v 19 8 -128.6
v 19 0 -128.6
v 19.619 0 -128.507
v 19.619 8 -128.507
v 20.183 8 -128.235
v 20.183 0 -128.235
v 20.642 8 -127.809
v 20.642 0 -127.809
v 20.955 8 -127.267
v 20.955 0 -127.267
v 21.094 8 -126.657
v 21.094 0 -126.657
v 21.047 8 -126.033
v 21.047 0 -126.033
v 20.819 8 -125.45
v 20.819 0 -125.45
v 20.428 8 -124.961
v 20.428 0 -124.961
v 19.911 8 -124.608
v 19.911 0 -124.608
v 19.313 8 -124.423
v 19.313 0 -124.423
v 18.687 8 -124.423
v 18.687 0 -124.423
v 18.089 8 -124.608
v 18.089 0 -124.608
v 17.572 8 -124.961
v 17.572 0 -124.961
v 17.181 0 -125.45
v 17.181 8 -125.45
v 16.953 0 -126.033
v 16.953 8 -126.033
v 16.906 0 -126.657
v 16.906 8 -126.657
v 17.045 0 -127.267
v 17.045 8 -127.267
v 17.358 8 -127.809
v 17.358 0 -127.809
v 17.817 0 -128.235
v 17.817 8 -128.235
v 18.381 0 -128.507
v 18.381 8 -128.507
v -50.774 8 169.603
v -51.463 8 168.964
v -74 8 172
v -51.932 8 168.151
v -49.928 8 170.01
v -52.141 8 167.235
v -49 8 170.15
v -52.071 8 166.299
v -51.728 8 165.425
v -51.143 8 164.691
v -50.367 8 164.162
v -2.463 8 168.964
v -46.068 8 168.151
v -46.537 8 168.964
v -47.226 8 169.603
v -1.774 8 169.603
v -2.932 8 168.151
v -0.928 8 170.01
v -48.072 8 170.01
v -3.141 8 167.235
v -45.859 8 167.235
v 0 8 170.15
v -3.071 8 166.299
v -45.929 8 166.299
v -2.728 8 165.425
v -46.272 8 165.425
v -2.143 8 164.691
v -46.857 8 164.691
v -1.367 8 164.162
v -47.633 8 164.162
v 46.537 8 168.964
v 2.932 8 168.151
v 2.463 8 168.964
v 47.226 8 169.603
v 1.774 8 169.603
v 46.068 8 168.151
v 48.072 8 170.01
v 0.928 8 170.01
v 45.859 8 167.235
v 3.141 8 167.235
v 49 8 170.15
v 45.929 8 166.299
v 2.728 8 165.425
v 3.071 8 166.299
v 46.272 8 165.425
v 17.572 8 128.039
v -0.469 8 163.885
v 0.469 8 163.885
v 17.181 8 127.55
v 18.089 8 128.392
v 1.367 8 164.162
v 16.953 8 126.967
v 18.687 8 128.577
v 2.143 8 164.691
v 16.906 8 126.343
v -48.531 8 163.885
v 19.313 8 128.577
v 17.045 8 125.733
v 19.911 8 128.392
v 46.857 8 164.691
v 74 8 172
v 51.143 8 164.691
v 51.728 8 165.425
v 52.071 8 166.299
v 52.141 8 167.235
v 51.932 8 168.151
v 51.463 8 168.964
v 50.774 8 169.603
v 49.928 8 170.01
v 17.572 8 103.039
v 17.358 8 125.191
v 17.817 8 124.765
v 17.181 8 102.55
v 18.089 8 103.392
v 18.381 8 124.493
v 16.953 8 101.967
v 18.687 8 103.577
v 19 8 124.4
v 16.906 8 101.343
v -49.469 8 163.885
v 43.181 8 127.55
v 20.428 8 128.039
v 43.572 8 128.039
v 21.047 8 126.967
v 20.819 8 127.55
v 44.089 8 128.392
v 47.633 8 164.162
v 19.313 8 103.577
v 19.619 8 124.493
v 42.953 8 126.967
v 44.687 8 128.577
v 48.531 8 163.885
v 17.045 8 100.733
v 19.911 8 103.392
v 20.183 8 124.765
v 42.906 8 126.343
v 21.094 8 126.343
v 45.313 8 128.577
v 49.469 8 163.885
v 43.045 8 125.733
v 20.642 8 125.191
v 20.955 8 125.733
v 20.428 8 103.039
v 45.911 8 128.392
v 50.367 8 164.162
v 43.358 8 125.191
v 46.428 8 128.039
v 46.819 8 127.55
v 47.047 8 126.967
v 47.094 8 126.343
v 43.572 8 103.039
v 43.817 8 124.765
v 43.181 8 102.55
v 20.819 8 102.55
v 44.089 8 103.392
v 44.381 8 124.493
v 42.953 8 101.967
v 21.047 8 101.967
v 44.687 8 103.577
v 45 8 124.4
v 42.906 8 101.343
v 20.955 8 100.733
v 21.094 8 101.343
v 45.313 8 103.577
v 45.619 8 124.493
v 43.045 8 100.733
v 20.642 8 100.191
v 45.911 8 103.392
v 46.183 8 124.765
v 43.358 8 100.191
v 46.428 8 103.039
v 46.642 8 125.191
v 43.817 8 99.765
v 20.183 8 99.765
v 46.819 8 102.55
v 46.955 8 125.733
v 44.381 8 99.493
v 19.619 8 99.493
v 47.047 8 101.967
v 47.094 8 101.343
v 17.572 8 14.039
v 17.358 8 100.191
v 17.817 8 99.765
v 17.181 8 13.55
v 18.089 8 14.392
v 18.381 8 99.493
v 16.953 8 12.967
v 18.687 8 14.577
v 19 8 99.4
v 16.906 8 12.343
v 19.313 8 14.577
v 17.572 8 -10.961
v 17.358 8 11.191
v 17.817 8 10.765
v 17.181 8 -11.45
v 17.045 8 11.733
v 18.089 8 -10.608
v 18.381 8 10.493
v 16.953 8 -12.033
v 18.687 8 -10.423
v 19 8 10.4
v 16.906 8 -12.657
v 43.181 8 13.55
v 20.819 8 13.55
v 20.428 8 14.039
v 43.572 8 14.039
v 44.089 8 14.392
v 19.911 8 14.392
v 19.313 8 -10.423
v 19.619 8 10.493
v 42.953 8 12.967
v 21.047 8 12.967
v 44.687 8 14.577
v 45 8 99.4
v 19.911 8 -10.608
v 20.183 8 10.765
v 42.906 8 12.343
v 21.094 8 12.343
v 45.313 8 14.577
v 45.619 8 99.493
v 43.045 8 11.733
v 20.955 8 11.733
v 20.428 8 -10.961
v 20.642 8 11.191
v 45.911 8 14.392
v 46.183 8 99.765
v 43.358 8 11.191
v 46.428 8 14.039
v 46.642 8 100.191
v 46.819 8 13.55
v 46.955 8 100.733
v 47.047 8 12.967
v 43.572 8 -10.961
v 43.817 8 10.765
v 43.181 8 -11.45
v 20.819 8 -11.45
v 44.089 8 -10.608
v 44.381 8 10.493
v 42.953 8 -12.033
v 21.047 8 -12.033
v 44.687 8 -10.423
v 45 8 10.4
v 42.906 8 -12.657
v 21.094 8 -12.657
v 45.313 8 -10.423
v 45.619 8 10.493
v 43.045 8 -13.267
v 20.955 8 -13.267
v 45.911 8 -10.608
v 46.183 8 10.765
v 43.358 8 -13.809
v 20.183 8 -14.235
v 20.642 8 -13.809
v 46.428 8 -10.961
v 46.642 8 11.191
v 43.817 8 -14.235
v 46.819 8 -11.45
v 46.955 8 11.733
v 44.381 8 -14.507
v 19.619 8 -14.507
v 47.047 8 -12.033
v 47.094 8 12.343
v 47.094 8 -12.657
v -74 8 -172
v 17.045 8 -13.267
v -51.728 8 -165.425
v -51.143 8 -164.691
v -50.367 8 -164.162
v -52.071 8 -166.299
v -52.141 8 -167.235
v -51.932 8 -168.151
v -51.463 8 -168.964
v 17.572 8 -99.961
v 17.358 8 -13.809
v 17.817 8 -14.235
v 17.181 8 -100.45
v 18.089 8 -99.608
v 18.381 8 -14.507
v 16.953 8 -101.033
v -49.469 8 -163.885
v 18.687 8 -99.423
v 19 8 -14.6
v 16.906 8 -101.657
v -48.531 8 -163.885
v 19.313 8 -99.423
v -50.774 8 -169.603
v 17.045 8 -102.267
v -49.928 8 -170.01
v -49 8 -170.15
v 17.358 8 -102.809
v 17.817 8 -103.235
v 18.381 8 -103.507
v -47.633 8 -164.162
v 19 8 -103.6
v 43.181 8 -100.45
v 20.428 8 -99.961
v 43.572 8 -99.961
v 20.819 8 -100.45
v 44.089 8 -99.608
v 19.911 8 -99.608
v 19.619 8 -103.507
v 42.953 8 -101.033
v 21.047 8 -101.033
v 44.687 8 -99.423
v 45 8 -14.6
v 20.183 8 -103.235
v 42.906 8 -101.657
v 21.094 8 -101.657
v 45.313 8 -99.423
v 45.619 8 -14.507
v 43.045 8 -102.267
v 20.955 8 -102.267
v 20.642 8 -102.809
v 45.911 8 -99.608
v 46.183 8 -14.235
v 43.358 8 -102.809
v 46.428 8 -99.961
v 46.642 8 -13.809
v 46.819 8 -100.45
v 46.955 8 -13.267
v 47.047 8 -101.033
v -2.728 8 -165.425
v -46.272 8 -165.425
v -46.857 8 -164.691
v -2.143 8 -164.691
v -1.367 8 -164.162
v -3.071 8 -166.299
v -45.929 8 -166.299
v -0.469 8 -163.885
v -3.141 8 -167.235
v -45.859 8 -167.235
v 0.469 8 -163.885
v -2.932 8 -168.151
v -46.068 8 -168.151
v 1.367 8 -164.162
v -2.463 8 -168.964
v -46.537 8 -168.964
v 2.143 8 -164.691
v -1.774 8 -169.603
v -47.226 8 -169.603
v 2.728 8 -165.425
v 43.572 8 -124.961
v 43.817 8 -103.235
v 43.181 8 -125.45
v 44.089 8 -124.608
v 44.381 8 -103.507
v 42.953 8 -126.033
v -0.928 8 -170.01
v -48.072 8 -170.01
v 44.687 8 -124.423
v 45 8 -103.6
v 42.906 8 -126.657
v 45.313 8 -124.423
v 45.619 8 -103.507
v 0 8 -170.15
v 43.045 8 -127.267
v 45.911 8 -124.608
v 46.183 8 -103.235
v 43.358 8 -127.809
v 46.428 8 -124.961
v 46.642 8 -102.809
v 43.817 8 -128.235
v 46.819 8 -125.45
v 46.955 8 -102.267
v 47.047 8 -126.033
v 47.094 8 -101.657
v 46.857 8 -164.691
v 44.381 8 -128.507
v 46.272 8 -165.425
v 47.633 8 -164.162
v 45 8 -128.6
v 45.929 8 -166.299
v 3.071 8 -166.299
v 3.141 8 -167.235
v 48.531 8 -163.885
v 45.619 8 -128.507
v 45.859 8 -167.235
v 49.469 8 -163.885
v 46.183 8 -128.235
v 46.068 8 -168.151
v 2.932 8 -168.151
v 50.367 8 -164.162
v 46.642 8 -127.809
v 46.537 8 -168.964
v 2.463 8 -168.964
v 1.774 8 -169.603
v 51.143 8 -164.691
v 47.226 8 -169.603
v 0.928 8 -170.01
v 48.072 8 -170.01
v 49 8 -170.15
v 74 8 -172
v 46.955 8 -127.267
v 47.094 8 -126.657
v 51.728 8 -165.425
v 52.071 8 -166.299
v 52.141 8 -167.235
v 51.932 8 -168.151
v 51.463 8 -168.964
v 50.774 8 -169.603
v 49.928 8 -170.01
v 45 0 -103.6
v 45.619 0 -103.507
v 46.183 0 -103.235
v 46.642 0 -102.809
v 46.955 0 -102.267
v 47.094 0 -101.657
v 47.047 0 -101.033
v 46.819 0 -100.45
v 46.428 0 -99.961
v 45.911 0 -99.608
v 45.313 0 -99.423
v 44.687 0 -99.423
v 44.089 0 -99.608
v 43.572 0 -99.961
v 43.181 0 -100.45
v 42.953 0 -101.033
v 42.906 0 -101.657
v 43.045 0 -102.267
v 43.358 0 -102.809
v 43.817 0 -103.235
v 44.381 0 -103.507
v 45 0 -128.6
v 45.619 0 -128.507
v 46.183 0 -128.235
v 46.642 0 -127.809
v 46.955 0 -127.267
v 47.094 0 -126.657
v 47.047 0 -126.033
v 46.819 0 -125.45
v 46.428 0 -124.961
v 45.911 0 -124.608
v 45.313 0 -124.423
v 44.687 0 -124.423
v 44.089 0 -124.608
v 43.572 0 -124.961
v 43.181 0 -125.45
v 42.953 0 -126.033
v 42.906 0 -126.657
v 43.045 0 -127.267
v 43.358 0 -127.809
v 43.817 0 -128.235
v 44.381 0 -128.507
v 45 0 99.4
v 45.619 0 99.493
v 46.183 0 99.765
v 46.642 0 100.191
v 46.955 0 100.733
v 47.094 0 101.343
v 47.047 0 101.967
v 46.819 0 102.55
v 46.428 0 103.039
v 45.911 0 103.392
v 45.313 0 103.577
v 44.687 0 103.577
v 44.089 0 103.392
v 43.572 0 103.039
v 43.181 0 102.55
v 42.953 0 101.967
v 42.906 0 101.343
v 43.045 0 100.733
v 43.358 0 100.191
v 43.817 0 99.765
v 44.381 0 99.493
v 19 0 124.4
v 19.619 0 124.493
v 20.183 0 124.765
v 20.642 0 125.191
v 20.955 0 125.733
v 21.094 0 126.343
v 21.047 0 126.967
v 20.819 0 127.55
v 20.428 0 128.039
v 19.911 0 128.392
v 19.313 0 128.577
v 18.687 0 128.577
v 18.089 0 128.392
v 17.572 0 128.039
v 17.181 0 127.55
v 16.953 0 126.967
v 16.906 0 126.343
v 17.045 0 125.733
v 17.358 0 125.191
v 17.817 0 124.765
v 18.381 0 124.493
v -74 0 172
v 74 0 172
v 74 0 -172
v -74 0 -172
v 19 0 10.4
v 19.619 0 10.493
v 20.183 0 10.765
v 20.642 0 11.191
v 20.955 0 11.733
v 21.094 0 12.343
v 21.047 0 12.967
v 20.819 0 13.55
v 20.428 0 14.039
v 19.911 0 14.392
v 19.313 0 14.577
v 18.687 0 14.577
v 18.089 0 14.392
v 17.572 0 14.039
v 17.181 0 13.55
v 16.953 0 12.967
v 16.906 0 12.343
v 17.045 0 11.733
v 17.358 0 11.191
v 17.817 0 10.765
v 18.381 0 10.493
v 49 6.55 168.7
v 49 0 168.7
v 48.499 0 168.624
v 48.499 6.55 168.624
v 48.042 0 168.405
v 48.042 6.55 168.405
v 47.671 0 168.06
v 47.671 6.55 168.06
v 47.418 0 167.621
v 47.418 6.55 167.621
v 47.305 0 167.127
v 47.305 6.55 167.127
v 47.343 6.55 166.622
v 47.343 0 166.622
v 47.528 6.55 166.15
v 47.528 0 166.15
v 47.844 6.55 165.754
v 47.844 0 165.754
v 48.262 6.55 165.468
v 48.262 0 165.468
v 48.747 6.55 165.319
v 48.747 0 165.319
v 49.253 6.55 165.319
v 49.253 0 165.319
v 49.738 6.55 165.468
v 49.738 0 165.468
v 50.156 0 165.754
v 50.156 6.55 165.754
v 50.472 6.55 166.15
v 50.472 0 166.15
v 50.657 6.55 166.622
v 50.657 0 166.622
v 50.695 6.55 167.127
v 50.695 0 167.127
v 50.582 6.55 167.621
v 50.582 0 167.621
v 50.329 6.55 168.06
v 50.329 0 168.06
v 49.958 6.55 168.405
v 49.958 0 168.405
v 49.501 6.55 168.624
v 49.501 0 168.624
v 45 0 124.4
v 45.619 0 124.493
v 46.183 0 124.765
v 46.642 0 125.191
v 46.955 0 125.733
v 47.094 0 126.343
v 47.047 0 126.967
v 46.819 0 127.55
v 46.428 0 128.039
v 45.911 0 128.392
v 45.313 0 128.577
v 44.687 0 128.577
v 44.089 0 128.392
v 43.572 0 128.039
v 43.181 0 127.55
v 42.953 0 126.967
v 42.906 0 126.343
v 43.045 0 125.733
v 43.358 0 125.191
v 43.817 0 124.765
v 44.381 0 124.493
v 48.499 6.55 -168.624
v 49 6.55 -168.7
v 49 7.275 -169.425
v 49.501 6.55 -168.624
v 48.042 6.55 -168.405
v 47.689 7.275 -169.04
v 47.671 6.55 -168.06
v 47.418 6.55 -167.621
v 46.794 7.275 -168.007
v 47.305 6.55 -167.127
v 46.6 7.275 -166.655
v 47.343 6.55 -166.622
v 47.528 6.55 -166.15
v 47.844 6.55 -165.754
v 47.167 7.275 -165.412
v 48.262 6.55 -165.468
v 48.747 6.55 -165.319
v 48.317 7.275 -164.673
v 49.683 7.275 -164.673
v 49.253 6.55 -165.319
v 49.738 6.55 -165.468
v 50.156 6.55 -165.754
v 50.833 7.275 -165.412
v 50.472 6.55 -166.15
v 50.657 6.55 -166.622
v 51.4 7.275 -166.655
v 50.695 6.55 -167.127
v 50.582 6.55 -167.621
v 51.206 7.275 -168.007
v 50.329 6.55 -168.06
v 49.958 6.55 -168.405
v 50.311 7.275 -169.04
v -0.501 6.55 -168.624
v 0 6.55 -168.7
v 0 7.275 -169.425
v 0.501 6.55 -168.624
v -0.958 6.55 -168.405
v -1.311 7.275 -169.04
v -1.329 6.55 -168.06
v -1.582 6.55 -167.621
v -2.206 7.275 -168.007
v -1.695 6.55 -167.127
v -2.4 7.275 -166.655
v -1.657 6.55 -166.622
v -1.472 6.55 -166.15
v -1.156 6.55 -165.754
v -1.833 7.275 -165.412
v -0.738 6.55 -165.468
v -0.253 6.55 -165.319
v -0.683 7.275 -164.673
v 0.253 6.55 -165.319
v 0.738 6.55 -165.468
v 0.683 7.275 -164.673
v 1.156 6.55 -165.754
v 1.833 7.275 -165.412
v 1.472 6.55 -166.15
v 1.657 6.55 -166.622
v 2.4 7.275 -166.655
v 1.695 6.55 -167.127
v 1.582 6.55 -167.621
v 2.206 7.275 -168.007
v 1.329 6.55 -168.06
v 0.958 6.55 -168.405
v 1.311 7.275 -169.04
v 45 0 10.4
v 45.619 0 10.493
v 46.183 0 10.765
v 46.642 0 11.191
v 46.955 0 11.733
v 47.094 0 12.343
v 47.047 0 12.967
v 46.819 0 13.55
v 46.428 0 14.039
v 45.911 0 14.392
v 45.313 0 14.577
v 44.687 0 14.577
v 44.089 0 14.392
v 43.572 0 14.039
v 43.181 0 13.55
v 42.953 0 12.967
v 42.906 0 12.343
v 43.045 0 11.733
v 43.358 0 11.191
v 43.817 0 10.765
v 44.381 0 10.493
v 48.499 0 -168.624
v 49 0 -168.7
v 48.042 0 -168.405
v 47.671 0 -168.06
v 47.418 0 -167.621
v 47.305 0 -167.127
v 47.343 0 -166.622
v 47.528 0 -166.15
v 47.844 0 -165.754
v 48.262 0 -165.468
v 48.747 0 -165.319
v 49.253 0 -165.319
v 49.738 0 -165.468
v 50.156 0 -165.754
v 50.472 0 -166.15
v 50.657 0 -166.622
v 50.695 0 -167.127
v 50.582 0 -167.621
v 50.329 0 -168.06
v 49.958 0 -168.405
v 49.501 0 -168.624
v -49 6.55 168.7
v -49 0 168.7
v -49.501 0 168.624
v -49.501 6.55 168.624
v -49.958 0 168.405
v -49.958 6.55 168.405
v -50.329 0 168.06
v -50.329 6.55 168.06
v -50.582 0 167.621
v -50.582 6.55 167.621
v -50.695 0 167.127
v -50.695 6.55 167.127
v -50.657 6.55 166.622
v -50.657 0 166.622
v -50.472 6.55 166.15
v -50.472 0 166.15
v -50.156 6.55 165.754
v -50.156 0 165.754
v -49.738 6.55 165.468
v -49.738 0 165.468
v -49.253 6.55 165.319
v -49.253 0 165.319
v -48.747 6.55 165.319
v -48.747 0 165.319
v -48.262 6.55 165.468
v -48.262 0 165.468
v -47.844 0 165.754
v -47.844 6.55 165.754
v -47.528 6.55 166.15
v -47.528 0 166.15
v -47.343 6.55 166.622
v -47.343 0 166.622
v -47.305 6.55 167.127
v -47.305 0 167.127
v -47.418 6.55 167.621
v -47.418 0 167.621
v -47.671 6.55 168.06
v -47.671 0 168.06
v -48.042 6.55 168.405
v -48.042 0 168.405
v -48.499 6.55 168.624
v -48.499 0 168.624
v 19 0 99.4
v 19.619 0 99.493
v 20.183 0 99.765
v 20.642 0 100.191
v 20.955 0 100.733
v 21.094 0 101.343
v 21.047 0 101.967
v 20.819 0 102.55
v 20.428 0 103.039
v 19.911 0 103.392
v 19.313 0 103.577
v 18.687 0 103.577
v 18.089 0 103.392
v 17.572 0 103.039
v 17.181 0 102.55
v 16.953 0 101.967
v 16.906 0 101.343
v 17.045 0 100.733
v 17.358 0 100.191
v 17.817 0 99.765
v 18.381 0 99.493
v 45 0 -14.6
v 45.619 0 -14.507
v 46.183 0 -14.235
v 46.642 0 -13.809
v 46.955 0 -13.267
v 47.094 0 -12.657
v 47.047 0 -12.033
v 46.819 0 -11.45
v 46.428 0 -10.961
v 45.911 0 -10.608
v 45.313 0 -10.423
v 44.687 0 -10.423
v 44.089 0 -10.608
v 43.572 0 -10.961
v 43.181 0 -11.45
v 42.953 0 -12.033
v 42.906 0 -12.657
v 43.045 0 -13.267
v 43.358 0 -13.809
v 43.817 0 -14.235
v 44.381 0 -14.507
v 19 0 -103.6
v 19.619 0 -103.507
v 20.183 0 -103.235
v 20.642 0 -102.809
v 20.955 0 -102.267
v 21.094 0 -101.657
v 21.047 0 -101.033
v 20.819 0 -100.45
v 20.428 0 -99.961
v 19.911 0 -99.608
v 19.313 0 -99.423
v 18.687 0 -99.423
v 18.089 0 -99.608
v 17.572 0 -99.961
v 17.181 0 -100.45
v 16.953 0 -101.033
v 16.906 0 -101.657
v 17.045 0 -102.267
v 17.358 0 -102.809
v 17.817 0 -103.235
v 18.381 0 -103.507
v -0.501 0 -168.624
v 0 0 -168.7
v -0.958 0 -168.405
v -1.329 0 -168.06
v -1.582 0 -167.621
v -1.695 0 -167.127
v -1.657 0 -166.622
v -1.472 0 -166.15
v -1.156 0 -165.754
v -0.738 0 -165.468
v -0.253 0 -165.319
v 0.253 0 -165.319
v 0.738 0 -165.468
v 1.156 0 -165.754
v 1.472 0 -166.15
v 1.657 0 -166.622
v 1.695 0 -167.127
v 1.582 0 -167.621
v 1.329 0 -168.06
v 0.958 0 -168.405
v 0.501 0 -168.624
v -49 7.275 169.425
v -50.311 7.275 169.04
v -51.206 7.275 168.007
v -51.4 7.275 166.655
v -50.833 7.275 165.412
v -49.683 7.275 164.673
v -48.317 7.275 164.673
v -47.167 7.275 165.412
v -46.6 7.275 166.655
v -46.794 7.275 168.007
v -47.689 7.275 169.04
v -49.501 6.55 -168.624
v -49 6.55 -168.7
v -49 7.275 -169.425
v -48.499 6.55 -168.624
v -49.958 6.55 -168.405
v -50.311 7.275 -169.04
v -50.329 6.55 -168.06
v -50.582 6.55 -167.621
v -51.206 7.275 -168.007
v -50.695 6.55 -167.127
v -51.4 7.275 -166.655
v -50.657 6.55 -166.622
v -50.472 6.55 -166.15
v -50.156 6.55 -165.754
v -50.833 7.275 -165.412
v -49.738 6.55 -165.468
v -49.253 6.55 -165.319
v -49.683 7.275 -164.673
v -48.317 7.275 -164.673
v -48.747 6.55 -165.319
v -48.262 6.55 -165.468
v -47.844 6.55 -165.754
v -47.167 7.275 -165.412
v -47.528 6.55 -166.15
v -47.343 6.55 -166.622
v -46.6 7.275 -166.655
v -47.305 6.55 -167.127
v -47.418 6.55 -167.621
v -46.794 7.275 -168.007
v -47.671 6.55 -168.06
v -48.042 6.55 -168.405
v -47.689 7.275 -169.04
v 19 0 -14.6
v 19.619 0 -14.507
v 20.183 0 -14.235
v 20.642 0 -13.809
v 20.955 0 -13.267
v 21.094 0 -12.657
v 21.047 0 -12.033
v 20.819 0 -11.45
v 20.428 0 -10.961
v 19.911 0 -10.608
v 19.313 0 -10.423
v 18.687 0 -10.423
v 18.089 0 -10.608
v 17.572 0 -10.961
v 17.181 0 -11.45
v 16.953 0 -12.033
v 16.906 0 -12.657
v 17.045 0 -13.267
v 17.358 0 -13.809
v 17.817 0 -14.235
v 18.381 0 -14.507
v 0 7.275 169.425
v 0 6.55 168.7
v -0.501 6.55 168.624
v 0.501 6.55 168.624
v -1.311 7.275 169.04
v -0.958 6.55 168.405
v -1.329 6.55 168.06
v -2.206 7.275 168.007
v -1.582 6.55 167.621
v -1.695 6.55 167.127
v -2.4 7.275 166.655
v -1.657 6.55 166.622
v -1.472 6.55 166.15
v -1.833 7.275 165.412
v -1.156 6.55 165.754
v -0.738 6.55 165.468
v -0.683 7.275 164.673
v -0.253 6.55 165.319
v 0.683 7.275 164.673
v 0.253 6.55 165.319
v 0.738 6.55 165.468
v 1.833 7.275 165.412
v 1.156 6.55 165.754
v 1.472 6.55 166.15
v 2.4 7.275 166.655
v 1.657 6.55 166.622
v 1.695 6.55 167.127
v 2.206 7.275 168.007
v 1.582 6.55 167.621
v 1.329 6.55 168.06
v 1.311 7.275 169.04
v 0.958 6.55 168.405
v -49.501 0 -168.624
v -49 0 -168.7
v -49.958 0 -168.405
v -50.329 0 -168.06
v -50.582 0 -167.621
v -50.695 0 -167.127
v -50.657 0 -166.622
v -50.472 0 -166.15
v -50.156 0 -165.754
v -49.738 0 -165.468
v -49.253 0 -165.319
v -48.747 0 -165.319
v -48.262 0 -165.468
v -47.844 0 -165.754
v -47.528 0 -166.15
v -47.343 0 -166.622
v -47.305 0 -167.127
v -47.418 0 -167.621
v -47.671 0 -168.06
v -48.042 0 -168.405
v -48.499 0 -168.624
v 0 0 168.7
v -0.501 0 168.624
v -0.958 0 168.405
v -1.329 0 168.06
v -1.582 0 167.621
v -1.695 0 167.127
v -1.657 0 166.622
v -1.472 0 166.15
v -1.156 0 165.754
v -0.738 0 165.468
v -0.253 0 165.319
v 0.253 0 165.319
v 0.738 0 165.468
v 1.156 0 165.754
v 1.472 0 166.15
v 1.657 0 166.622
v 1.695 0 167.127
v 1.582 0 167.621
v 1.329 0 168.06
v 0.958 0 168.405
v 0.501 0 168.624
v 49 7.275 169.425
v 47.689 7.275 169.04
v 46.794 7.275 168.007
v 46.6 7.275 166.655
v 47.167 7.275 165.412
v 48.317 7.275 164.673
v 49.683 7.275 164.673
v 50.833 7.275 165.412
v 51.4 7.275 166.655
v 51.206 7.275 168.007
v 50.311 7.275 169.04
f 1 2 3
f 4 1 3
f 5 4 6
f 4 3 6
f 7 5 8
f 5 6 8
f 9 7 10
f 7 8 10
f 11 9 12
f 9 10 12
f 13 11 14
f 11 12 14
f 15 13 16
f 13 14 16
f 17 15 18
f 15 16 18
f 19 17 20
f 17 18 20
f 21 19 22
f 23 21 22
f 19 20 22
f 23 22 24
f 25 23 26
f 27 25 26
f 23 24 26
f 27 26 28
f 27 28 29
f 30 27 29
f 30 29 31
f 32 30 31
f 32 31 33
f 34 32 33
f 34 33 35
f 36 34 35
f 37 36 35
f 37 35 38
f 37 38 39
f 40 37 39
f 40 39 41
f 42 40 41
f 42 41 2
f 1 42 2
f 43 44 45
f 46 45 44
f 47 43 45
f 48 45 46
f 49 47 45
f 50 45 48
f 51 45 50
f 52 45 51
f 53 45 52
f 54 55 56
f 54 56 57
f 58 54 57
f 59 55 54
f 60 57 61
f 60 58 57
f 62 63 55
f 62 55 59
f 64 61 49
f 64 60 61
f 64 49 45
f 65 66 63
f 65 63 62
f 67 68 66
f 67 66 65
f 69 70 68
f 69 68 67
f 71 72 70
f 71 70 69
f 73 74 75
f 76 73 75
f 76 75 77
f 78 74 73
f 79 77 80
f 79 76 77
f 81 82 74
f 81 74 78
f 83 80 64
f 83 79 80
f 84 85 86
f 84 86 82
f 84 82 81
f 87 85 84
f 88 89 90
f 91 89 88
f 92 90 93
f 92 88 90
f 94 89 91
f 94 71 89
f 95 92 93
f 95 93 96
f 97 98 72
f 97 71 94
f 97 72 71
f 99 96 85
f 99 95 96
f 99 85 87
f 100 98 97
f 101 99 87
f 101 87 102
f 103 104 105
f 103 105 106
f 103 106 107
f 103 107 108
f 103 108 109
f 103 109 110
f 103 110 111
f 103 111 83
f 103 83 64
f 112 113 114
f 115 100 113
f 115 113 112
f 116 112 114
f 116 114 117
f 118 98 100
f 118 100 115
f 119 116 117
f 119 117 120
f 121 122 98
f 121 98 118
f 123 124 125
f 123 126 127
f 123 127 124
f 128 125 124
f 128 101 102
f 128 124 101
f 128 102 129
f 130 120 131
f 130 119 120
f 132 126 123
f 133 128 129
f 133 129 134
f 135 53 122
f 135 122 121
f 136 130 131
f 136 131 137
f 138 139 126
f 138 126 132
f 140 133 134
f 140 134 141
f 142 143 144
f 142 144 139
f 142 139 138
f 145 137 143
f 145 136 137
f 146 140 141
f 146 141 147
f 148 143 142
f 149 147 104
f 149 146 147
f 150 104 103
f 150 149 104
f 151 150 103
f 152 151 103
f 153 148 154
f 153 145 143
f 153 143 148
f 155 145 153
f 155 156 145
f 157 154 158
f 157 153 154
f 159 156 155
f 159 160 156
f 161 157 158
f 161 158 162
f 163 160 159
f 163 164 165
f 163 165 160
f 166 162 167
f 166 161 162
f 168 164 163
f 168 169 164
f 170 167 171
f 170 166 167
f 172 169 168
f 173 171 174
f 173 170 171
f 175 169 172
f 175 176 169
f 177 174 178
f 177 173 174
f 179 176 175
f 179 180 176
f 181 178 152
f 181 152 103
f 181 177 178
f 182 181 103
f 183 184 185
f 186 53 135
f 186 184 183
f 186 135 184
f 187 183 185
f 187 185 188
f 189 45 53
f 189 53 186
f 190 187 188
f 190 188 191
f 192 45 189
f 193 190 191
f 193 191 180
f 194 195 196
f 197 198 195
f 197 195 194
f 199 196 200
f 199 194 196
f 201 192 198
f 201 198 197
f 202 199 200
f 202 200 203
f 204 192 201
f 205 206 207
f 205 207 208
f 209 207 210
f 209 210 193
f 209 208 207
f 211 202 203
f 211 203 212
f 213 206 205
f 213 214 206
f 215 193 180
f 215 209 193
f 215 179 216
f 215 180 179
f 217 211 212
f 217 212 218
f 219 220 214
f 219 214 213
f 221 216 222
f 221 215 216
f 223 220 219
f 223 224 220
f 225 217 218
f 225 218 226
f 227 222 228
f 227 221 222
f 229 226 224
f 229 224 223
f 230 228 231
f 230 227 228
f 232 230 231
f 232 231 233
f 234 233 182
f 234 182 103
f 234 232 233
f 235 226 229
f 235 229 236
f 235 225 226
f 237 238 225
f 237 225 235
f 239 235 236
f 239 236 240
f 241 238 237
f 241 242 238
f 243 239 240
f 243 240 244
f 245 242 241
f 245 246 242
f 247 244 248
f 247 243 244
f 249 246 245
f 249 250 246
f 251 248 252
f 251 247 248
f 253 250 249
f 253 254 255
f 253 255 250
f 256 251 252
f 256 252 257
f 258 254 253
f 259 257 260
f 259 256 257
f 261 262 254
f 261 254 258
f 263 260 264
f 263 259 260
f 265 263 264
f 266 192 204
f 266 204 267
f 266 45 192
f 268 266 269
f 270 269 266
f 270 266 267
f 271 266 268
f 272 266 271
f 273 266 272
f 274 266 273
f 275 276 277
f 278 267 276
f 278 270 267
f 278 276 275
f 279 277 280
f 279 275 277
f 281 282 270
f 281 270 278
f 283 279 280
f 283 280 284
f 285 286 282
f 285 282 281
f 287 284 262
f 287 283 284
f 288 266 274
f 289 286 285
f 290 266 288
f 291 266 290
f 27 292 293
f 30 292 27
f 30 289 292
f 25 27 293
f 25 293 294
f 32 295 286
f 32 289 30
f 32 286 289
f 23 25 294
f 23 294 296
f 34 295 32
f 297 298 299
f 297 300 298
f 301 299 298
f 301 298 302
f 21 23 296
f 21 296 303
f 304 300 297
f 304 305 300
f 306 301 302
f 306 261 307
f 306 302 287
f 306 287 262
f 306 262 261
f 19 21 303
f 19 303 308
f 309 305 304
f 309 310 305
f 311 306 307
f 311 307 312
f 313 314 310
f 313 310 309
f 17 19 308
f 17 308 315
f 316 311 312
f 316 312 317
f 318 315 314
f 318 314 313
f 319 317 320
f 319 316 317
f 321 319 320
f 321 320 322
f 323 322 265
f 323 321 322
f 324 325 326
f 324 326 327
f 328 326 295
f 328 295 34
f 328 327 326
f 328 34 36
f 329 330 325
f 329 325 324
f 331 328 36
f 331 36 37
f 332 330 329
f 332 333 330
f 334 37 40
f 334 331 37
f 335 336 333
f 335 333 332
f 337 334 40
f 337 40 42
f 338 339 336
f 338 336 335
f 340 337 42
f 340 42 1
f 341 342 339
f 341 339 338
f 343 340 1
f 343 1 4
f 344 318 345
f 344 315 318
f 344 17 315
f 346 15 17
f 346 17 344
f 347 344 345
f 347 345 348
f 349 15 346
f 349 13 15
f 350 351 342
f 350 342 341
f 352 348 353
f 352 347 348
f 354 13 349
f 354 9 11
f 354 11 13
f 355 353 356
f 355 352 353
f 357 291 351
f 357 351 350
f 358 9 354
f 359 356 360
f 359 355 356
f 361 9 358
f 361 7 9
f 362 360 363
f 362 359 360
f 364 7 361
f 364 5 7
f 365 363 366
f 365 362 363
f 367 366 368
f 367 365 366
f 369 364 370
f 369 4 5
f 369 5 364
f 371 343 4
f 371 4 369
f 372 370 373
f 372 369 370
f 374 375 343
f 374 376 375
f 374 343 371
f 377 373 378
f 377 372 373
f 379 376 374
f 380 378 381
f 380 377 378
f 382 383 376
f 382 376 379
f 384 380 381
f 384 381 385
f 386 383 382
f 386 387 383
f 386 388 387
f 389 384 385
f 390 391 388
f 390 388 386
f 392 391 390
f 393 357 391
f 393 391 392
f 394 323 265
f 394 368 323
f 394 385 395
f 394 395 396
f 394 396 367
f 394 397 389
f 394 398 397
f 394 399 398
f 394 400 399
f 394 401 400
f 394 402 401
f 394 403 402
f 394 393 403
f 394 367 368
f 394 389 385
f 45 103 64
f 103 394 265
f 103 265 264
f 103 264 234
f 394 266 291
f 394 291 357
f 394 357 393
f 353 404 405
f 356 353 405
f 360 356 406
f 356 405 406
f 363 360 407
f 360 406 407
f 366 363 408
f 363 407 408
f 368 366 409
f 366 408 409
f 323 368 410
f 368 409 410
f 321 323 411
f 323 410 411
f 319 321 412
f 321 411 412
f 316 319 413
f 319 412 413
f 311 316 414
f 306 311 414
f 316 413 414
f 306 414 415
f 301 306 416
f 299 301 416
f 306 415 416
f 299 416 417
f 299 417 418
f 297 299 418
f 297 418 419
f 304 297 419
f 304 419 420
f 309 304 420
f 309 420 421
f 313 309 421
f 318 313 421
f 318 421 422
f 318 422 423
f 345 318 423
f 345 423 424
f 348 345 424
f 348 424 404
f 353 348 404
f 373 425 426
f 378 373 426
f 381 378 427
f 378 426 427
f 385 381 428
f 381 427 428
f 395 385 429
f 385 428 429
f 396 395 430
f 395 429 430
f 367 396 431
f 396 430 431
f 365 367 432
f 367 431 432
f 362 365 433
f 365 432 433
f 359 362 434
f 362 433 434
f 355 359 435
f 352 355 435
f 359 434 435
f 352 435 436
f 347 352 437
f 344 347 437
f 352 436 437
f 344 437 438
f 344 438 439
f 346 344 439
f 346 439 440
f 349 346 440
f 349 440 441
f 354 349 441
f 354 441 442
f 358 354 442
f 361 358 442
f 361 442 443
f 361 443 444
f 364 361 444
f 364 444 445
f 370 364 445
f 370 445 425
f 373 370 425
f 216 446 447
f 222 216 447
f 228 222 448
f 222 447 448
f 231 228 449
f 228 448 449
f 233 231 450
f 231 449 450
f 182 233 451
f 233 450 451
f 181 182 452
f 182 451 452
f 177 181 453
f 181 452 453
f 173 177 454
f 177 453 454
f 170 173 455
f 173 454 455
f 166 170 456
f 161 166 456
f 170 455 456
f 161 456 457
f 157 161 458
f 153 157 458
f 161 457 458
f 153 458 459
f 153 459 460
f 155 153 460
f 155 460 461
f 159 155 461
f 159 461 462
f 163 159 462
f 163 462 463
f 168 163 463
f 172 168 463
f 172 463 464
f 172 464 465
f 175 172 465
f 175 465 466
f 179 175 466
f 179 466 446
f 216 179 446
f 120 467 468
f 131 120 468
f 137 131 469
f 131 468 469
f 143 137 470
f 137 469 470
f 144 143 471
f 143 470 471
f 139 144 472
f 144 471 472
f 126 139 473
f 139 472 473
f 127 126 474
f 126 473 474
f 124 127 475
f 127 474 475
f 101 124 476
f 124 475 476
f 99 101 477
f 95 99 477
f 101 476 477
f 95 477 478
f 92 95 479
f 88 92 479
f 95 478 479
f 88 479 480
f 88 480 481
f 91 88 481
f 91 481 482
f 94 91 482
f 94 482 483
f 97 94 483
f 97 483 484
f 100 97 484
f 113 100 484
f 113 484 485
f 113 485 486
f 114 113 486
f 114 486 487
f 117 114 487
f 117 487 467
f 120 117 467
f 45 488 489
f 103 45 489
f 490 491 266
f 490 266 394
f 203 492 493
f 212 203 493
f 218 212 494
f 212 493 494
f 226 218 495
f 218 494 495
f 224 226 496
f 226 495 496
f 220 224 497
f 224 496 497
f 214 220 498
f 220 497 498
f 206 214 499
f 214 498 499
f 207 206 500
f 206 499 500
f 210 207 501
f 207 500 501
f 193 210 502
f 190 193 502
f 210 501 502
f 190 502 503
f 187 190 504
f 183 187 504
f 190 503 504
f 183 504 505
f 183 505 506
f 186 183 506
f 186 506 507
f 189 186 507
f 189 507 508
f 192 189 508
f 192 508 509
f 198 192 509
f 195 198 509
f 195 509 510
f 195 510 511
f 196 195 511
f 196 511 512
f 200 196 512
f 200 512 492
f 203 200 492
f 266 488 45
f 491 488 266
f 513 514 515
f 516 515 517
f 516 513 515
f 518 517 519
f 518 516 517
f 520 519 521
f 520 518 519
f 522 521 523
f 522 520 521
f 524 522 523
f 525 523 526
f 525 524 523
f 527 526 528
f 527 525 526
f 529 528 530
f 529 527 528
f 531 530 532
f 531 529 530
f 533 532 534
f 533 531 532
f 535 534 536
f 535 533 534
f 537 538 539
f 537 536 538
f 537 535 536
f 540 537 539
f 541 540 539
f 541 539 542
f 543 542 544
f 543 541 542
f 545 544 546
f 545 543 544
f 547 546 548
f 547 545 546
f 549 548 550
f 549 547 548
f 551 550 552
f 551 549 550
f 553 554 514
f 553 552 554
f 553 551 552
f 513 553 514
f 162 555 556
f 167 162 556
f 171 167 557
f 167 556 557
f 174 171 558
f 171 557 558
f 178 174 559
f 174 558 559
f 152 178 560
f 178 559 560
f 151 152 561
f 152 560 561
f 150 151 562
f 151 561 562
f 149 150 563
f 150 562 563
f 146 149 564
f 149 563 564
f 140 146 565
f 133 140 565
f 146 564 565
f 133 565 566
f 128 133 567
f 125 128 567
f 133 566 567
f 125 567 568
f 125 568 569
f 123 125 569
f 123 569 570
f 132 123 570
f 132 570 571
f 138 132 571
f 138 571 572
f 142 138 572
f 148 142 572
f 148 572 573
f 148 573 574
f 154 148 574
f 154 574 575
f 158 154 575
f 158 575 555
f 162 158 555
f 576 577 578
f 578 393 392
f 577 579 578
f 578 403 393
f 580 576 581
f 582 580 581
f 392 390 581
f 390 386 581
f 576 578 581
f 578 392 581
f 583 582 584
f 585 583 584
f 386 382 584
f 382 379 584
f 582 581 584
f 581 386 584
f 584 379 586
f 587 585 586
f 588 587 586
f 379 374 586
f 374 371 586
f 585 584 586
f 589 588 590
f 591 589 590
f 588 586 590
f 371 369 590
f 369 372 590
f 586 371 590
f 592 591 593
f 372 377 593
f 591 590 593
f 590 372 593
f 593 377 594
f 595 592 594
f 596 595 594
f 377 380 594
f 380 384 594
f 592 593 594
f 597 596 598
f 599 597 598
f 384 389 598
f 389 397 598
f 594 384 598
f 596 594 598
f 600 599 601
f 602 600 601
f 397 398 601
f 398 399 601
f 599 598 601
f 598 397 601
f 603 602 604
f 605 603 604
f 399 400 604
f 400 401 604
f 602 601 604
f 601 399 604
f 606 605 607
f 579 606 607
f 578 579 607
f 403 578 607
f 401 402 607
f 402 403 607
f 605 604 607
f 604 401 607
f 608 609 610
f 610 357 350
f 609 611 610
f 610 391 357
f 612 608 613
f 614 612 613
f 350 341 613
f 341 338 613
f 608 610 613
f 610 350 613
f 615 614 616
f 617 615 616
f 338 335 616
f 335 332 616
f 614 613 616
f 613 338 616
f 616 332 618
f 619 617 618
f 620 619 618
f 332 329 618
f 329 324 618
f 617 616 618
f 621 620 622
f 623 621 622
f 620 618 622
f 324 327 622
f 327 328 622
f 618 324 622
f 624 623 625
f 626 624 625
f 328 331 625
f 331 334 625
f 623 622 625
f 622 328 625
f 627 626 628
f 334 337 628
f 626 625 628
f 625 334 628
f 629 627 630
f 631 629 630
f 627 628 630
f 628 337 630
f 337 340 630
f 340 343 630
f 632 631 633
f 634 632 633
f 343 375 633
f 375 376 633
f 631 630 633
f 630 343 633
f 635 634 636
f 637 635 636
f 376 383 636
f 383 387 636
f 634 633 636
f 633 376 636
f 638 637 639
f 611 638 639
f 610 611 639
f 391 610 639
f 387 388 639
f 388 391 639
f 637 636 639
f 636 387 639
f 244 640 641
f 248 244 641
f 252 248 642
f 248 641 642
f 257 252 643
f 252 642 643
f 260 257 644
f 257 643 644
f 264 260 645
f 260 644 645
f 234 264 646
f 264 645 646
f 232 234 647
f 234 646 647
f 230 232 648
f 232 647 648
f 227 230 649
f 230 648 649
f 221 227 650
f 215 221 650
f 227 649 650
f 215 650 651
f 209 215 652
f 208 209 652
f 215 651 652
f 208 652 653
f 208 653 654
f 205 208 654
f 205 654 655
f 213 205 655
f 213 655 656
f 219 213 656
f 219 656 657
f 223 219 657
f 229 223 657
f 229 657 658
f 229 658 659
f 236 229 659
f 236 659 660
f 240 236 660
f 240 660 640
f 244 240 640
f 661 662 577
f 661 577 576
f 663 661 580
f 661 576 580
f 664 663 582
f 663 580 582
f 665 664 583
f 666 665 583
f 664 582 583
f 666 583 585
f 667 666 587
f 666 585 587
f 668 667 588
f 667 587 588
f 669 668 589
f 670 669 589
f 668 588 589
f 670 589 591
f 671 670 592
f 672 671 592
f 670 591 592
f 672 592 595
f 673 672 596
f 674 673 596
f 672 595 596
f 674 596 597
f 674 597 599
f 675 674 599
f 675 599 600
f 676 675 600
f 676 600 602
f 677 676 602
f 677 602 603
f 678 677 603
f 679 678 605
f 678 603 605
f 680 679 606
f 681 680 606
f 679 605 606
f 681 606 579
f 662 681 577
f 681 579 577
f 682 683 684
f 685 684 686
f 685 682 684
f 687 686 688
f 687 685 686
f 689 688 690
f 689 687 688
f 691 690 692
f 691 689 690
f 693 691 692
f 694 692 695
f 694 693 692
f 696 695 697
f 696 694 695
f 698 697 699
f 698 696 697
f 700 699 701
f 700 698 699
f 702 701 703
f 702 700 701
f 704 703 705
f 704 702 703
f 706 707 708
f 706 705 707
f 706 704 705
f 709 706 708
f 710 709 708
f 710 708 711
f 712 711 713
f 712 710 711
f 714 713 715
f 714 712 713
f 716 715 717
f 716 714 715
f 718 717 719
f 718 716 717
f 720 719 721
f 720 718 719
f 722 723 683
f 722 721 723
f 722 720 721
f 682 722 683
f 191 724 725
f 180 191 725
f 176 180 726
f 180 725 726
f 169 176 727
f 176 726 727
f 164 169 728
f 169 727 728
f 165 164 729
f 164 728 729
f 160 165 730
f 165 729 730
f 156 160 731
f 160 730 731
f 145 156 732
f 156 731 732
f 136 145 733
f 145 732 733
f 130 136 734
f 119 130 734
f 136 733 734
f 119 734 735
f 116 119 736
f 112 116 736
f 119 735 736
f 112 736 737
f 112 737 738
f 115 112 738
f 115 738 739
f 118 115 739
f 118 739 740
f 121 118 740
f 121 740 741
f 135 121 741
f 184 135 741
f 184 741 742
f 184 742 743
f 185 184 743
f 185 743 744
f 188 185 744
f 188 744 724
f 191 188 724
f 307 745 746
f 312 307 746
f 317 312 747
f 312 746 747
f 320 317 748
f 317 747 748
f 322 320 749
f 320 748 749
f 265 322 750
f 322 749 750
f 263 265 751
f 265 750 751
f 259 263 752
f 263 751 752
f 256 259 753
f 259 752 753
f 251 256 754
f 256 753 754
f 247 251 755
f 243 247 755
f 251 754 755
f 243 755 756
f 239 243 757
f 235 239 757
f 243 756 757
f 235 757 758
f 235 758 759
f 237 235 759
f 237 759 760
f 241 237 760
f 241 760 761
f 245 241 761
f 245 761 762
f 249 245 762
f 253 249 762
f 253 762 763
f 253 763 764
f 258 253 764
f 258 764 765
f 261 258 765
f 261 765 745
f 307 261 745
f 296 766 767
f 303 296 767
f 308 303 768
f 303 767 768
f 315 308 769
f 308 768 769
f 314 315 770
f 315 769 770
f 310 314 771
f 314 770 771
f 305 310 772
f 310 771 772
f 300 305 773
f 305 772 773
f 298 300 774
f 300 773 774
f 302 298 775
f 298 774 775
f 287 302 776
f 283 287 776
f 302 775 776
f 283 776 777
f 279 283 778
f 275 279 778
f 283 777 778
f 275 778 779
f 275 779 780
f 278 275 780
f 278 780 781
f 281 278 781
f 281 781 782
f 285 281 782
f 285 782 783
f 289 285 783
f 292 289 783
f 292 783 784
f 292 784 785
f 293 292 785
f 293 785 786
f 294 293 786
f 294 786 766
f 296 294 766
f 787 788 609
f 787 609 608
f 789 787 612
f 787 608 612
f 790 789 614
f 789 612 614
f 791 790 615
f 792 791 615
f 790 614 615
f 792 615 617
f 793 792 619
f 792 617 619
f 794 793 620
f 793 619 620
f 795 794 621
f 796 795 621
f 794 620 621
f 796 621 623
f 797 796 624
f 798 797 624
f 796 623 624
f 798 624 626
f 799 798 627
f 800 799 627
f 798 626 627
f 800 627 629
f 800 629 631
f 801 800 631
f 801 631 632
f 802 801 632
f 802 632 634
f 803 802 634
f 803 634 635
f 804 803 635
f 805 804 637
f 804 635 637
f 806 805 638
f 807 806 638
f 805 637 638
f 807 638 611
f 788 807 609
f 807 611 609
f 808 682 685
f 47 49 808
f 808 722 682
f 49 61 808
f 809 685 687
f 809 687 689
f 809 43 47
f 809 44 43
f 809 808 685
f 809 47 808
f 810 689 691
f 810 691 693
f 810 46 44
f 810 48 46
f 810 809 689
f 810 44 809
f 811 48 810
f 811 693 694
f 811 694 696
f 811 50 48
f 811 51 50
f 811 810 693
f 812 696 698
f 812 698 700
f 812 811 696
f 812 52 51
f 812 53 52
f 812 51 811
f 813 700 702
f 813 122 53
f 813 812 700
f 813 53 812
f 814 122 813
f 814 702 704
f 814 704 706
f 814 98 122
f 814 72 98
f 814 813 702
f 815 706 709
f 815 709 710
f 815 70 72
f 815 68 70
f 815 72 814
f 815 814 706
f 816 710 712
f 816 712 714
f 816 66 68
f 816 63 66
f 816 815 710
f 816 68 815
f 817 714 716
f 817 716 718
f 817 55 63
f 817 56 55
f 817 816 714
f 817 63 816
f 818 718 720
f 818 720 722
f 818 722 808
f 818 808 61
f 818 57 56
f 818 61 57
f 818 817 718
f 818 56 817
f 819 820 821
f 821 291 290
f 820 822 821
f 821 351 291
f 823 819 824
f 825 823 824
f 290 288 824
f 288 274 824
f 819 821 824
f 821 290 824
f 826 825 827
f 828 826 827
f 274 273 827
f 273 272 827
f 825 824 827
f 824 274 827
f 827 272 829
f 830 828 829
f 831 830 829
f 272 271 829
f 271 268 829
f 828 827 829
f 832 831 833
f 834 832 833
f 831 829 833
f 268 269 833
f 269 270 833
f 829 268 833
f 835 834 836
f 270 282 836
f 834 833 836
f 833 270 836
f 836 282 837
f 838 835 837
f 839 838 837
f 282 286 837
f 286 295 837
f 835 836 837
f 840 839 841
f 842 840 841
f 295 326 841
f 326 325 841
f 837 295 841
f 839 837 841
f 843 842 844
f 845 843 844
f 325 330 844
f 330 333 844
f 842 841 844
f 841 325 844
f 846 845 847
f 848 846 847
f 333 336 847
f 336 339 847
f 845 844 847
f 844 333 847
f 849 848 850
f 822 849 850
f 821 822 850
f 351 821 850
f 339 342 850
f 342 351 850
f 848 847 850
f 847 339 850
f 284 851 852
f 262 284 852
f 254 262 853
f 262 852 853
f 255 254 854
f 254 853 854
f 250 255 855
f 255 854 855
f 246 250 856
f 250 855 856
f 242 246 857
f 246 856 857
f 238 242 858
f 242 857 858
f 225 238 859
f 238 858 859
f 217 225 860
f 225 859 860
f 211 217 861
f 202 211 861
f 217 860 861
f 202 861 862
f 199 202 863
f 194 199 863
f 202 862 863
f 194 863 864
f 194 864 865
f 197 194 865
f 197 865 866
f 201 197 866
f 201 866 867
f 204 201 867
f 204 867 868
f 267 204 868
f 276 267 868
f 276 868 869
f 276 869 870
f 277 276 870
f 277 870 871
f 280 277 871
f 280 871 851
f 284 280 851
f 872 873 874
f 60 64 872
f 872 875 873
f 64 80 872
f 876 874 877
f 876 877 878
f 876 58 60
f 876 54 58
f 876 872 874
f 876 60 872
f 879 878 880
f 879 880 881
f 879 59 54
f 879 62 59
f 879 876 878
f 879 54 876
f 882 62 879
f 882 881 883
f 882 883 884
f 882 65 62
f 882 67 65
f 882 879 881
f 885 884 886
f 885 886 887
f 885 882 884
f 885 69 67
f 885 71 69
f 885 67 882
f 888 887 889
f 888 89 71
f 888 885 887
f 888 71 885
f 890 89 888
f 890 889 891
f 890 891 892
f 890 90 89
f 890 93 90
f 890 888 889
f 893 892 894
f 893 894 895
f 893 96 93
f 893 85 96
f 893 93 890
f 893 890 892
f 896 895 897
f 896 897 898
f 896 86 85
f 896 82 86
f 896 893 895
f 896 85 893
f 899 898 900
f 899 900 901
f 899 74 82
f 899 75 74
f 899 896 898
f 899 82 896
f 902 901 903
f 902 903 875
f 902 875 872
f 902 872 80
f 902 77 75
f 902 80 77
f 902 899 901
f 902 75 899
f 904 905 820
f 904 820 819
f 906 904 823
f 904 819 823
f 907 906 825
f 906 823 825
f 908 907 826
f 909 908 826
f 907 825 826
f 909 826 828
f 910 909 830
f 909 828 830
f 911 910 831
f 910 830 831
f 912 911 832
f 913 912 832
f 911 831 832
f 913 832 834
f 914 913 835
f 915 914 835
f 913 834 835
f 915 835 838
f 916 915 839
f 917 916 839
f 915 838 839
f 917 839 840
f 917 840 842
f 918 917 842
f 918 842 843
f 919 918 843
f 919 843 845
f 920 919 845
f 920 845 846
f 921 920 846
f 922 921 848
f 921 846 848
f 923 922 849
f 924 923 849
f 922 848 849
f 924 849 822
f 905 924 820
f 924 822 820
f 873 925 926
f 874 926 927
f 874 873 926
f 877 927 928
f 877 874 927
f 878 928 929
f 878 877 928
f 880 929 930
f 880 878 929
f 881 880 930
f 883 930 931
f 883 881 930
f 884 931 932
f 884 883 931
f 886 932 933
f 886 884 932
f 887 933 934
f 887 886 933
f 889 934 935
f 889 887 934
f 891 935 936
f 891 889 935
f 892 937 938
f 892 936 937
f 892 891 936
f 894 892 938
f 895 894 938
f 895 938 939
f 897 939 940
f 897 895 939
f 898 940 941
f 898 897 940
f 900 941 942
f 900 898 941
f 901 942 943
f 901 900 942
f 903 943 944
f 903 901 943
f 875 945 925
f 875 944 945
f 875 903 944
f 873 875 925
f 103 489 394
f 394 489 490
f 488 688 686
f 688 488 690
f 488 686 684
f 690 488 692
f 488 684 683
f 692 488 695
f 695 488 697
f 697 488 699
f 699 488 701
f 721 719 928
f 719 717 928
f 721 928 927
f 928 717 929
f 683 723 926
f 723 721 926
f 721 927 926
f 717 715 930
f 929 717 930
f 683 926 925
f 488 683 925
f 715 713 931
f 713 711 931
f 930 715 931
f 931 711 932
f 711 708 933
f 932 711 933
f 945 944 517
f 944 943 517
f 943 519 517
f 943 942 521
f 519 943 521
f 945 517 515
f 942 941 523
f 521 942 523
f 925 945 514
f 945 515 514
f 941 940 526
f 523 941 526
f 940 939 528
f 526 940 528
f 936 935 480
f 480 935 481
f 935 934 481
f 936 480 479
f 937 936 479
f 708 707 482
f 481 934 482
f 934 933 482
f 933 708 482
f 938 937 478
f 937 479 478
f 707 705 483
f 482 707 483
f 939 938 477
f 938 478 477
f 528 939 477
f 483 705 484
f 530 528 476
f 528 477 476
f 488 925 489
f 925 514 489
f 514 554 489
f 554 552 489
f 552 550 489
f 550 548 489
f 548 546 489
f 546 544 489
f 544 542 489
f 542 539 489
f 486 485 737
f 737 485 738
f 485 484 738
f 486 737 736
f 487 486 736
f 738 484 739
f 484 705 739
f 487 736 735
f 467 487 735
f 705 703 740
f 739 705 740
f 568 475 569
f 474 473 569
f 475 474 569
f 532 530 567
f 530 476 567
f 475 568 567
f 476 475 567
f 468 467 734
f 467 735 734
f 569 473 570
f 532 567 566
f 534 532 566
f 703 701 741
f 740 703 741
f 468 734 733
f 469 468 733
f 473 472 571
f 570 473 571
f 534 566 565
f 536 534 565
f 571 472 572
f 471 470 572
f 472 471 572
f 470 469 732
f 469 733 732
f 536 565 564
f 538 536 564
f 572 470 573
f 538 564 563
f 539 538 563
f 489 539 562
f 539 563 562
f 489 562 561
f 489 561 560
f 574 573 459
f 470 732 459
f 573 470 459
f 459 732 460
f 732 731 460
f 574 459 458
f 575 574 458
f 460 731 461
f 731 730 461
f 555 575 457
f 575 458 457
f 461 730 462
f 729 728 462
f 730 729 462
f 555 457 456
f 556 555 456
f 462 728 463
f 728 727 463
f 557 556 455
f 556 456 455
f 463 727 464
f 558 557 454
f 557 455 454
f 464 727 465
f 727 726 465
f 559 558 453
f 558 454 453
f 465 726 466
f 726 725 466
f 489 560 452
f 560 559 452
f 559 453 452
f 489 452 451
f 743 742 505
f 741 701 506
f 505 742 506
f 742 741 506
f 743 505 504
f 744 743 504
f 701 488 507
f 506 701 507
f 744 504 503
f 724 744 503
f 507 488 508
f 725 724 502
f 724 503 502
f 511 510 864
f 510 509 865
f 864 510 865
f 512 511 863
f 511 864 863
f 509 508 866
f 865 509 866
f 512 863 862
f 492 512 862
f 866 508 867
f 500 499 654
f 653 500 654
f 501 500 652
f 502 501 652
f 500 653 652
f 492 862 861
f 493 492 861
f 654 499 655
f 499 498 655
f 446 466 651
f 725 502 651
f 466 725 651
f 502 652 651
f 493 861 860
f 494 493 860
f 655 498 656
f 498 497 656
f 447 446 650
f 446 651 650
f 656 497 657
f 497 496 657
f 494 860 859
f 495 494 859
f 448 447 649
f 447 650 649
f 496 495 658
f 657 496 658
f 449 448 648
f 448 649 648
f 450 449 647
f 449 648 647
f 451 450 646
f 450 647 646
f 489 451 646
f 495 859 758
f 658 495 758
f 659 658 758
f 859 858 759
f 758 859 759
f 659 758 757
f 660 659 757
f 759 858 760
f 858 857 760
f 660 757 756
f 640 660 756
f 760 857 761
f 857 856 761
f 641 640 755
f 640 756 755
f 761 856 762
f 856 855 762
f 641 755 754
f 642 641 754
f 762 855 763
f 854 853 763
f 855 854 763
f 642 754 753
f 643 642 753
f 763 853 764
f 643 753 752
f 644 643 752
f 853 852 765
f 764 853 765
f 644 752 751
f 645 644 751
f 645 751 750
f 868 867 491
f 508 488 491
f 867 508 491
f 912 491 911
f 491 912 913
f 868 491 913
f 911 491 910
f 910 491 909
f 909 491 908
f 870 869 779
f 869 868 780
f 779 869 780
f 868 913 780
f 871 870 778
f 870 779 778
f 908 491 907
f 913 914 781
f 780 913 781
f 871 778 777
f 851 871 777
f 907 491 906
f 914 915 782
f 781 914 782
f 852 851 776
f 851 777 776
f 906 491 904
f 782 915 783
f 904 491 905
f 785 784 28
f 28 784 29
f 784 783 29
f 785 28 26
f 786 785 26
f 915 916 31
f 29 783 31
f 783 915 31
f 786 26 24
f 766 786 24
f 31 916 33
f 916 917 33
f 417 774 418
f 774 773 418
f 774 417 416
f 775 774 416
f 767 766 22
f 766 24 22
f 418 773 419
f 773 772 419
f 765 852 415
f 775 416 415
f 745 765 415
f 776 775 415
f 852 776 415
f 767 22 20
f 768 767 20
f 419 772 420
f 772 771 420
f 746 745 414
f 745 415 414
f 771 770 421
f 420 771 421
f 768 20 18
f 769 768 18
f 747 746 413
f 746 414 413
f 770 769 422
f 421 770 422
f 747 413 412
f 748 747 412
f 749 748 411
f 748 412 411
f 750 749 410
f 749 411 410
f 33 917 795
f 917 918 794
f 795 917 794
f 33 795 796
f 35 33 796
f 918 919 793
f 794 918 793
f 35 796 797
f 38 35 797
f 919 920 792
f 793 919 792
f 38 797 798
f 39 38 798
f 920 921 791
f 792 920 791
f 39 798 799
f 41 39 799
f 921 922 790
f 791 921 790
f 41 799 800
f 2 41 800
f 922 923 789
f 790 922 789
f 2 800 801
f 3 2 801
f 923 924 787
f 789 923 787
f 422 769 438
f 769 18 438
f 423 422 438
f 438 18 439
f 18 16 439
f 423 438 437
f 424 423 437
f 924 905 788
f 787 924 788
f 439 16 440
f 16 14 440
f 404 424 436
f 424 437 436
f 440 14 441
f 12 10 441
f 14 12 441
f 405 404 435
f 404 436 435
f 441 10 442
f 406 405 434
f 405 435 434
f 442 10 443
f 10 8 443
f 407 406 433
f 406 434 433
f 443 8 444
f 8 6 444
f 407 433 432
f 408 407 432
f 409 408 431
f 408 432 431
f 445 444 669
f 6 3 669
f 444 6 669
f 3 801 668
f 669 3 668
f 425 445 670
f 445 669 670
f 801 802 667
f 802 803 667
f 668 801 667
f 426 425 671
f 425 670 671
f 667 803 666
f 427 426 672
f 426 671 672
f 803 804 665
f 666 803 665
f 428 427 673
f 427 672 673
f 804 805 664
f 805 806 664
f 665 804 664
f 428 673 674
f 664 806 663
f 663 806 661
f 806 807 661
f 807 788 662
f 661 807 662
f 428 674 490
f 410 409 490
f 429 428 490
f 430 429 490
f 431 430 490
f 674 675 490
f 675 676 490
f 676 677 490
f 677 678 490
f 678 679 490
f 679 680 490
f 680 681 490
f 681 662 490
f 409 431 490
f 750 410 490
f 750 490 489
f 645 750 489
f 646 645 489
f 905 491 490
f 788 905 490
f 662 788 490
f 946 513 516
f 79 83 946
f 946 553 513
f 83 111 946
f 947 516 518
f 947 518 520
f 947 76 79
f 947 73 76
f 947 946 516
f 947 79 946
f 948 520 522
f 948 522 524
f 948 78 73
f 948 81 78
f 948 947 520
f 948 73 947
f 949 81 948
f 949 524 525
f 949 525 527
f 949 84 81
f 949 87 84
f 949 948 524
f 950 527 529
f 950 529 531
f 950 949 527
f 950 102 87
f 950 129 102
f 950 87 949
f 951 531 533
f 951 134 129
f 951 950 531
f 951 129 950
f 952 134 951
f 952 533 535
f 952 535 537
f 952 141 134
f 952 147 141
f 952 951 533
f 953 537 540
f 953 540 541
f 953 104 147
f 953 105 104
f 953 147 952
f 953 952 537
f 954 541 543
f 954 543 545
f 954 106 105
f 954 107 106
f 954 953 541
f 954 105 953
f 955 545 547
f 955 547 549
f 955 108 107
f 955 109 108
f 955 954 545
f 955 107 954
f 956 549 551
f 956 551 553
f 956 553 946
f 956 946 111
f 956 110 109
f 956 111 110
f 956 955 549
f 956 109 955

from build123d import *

# Parameters (mm, degrees)
SKETCH1_W                                    = 148
SKETCH1_H                                    = 344
BOSS_EXTRUDE1_DEPTH                          = 8
CSK_FOR_M3_COUNTERSUNK_FLAT_HEAD1_AT_2_COUNT = 2
CSK_FOR_M3_COUNTERSUNK_FLAT_HEAD1_AT_2_PITCH = 49
CSK_FOR_M3_COUNTERSUNK_FLAT_HEAD1_AT_3_COUNT = 2
CSK_FOR_M3_COUNTERSUNK_FLAT_HEAD1_AT_3_PITCH = 98
M5X0_8_TAPPED_HOLE1_D                        = 4.2
LPATTERN1_COUNT                              = 2
LPATTERN1_PITCH                              = 114
LPATTERN1_COL_COUNT                          = 2
LPATTERN1_COL_PITCH                          = 114


with BuildPart() as part:
    # Sketch1 → Boss-Extrude1 (new body)
    with BuildSketch(Plane(origin=(0, 0, 0), x_dir=(1, 0, 0), z_dir=(0, 1, 0))):
        Rectangle(SKETCH1_W, SKETCH1_H)
    extrude(amount=BOSS_EXTRUDE1_DEPTH)

    # Sketch3 → CSK for M3 Countersunk Flat Head1 (revolve, cut)
    with BuildSketch(Plane(origin=(-49, 8, 167), x_dir=(0, 0, 1), z_dir=(1, 0, 0))):
        Polygon((0, 0), (0, 16.021463052), (1.7, 15), (1.7, 1.45), (3.15, 0), align=None)
    csk_for_m3_countersunk_flat_head1 = revolve(axis=Axis((-49, 14.35, 167), (0, -1, 0)), mode=Mode.SUBTRACT)

    # CSK for M3 Countersunk Flat Head1 at 2: CSK for M3 Countersunk Flat Head1 ×2
    with Locations(*[(i * CSK_FOR_M3_COUNTERSUNK_FLAT_HEAD1_AT_2_PITCH, 0, 0) for i in range(1, CSK_FOR_M3_COUNTERSUNK_FLAT_HEAD1_AT_2_COUNT)]):
        add(csk_for_m3_countersunk_flat_head1, mode=Mode.SUBTRACT)

    # CSK for M3 Countersunk Flat Head1 at 3: CSK for M3 Countersunk Flat Head1 ×2
    with Locations(*[(i * CSK_FOR_M3_COUNTERSUNK_FLAT_HEAD1_AT_3_PITCH, 0, 0) for i in range(1, CSK_FOR_M3_COUNTERSUNK_FLAT_HEAD1_AT_3_COUNT)]):
        add(csk_for_m3_countersunk_flat_head1, mode=Mode.SUBTRACT)

    # Mirror1: CSK for M3 Countersunk Flat Head1 across plane
    add(csk_for_m3_countersunk_flat_head1.mirror(Plane.XY), mode=Mode.SUBTRACT)

    # Mirror1 copy 1 sketch → Mirror1 copy 1 (revolve, cut)
    with BuildSketch(Plane(origin=(0, 8, -167), x_dir=(0, 0, -1), z_dir=(1, 0, 0))):
        Polygon((0, 0), (0, -16.021463052), (1.7, -15), (1.7, -1.45), (3.15, 0), align=None)
    revolve(axis=Axis((0, 14.35, -167), (0, 1, 0)), mode=Mode.SUBTRACT)

    # Mirror1 copy 2 sketch → Mirror1 copy 2 (revolve, cut)
    with BuildSketch(Plane(origin=(49, 8, -167), x_dir=(0, 0, -1), z_dir=(1, 0, 0))):
        Polygon((0, 0), (0, -16.021463052), (1.7, -15), (1.7, -1.45), (3.15, 0), align=None)
    revolve(axis=Axis((49, 14.35, -167), (0, 1, 0)), mode=Mode.SUBTRACT)

    # M5x0.8 Tapped Hole1 (through all)
    with Locations(Plane(origin=(45, 8, -12.5), x_dir=(0, 0, 1), z_dir=(0, 1, 0))):
        with Locations((0, 0), (0, -26), (25, -26), (25, 0)):
            m5x0_8_tapped_hole1 = Hole(M5X0_8_TAPPED_HOLE1_D / 2)

    # LPattern1: M5x0.8 Tapped Hole1 ×2
    with Locations(*[(0, 0, i * LPATTERN1_PITCH) for i in range(1, LPATTERN1_COUNT)]):
        add(m5x0_8_tapped_hole1, mode=Mode.SUBTRACT)

    # LPattern1 col: M5x0.8 Tapped Hole1 ×2
    with Locations(*[(0, 0, -i * LPATTERN1_COL_PITCH) for i in range(1, LPATTERN1_COL_COUNT)]):
        add(m5x0_8_tapped_hole1, mode=Mode.SUBTRACT)


solid = part.part
